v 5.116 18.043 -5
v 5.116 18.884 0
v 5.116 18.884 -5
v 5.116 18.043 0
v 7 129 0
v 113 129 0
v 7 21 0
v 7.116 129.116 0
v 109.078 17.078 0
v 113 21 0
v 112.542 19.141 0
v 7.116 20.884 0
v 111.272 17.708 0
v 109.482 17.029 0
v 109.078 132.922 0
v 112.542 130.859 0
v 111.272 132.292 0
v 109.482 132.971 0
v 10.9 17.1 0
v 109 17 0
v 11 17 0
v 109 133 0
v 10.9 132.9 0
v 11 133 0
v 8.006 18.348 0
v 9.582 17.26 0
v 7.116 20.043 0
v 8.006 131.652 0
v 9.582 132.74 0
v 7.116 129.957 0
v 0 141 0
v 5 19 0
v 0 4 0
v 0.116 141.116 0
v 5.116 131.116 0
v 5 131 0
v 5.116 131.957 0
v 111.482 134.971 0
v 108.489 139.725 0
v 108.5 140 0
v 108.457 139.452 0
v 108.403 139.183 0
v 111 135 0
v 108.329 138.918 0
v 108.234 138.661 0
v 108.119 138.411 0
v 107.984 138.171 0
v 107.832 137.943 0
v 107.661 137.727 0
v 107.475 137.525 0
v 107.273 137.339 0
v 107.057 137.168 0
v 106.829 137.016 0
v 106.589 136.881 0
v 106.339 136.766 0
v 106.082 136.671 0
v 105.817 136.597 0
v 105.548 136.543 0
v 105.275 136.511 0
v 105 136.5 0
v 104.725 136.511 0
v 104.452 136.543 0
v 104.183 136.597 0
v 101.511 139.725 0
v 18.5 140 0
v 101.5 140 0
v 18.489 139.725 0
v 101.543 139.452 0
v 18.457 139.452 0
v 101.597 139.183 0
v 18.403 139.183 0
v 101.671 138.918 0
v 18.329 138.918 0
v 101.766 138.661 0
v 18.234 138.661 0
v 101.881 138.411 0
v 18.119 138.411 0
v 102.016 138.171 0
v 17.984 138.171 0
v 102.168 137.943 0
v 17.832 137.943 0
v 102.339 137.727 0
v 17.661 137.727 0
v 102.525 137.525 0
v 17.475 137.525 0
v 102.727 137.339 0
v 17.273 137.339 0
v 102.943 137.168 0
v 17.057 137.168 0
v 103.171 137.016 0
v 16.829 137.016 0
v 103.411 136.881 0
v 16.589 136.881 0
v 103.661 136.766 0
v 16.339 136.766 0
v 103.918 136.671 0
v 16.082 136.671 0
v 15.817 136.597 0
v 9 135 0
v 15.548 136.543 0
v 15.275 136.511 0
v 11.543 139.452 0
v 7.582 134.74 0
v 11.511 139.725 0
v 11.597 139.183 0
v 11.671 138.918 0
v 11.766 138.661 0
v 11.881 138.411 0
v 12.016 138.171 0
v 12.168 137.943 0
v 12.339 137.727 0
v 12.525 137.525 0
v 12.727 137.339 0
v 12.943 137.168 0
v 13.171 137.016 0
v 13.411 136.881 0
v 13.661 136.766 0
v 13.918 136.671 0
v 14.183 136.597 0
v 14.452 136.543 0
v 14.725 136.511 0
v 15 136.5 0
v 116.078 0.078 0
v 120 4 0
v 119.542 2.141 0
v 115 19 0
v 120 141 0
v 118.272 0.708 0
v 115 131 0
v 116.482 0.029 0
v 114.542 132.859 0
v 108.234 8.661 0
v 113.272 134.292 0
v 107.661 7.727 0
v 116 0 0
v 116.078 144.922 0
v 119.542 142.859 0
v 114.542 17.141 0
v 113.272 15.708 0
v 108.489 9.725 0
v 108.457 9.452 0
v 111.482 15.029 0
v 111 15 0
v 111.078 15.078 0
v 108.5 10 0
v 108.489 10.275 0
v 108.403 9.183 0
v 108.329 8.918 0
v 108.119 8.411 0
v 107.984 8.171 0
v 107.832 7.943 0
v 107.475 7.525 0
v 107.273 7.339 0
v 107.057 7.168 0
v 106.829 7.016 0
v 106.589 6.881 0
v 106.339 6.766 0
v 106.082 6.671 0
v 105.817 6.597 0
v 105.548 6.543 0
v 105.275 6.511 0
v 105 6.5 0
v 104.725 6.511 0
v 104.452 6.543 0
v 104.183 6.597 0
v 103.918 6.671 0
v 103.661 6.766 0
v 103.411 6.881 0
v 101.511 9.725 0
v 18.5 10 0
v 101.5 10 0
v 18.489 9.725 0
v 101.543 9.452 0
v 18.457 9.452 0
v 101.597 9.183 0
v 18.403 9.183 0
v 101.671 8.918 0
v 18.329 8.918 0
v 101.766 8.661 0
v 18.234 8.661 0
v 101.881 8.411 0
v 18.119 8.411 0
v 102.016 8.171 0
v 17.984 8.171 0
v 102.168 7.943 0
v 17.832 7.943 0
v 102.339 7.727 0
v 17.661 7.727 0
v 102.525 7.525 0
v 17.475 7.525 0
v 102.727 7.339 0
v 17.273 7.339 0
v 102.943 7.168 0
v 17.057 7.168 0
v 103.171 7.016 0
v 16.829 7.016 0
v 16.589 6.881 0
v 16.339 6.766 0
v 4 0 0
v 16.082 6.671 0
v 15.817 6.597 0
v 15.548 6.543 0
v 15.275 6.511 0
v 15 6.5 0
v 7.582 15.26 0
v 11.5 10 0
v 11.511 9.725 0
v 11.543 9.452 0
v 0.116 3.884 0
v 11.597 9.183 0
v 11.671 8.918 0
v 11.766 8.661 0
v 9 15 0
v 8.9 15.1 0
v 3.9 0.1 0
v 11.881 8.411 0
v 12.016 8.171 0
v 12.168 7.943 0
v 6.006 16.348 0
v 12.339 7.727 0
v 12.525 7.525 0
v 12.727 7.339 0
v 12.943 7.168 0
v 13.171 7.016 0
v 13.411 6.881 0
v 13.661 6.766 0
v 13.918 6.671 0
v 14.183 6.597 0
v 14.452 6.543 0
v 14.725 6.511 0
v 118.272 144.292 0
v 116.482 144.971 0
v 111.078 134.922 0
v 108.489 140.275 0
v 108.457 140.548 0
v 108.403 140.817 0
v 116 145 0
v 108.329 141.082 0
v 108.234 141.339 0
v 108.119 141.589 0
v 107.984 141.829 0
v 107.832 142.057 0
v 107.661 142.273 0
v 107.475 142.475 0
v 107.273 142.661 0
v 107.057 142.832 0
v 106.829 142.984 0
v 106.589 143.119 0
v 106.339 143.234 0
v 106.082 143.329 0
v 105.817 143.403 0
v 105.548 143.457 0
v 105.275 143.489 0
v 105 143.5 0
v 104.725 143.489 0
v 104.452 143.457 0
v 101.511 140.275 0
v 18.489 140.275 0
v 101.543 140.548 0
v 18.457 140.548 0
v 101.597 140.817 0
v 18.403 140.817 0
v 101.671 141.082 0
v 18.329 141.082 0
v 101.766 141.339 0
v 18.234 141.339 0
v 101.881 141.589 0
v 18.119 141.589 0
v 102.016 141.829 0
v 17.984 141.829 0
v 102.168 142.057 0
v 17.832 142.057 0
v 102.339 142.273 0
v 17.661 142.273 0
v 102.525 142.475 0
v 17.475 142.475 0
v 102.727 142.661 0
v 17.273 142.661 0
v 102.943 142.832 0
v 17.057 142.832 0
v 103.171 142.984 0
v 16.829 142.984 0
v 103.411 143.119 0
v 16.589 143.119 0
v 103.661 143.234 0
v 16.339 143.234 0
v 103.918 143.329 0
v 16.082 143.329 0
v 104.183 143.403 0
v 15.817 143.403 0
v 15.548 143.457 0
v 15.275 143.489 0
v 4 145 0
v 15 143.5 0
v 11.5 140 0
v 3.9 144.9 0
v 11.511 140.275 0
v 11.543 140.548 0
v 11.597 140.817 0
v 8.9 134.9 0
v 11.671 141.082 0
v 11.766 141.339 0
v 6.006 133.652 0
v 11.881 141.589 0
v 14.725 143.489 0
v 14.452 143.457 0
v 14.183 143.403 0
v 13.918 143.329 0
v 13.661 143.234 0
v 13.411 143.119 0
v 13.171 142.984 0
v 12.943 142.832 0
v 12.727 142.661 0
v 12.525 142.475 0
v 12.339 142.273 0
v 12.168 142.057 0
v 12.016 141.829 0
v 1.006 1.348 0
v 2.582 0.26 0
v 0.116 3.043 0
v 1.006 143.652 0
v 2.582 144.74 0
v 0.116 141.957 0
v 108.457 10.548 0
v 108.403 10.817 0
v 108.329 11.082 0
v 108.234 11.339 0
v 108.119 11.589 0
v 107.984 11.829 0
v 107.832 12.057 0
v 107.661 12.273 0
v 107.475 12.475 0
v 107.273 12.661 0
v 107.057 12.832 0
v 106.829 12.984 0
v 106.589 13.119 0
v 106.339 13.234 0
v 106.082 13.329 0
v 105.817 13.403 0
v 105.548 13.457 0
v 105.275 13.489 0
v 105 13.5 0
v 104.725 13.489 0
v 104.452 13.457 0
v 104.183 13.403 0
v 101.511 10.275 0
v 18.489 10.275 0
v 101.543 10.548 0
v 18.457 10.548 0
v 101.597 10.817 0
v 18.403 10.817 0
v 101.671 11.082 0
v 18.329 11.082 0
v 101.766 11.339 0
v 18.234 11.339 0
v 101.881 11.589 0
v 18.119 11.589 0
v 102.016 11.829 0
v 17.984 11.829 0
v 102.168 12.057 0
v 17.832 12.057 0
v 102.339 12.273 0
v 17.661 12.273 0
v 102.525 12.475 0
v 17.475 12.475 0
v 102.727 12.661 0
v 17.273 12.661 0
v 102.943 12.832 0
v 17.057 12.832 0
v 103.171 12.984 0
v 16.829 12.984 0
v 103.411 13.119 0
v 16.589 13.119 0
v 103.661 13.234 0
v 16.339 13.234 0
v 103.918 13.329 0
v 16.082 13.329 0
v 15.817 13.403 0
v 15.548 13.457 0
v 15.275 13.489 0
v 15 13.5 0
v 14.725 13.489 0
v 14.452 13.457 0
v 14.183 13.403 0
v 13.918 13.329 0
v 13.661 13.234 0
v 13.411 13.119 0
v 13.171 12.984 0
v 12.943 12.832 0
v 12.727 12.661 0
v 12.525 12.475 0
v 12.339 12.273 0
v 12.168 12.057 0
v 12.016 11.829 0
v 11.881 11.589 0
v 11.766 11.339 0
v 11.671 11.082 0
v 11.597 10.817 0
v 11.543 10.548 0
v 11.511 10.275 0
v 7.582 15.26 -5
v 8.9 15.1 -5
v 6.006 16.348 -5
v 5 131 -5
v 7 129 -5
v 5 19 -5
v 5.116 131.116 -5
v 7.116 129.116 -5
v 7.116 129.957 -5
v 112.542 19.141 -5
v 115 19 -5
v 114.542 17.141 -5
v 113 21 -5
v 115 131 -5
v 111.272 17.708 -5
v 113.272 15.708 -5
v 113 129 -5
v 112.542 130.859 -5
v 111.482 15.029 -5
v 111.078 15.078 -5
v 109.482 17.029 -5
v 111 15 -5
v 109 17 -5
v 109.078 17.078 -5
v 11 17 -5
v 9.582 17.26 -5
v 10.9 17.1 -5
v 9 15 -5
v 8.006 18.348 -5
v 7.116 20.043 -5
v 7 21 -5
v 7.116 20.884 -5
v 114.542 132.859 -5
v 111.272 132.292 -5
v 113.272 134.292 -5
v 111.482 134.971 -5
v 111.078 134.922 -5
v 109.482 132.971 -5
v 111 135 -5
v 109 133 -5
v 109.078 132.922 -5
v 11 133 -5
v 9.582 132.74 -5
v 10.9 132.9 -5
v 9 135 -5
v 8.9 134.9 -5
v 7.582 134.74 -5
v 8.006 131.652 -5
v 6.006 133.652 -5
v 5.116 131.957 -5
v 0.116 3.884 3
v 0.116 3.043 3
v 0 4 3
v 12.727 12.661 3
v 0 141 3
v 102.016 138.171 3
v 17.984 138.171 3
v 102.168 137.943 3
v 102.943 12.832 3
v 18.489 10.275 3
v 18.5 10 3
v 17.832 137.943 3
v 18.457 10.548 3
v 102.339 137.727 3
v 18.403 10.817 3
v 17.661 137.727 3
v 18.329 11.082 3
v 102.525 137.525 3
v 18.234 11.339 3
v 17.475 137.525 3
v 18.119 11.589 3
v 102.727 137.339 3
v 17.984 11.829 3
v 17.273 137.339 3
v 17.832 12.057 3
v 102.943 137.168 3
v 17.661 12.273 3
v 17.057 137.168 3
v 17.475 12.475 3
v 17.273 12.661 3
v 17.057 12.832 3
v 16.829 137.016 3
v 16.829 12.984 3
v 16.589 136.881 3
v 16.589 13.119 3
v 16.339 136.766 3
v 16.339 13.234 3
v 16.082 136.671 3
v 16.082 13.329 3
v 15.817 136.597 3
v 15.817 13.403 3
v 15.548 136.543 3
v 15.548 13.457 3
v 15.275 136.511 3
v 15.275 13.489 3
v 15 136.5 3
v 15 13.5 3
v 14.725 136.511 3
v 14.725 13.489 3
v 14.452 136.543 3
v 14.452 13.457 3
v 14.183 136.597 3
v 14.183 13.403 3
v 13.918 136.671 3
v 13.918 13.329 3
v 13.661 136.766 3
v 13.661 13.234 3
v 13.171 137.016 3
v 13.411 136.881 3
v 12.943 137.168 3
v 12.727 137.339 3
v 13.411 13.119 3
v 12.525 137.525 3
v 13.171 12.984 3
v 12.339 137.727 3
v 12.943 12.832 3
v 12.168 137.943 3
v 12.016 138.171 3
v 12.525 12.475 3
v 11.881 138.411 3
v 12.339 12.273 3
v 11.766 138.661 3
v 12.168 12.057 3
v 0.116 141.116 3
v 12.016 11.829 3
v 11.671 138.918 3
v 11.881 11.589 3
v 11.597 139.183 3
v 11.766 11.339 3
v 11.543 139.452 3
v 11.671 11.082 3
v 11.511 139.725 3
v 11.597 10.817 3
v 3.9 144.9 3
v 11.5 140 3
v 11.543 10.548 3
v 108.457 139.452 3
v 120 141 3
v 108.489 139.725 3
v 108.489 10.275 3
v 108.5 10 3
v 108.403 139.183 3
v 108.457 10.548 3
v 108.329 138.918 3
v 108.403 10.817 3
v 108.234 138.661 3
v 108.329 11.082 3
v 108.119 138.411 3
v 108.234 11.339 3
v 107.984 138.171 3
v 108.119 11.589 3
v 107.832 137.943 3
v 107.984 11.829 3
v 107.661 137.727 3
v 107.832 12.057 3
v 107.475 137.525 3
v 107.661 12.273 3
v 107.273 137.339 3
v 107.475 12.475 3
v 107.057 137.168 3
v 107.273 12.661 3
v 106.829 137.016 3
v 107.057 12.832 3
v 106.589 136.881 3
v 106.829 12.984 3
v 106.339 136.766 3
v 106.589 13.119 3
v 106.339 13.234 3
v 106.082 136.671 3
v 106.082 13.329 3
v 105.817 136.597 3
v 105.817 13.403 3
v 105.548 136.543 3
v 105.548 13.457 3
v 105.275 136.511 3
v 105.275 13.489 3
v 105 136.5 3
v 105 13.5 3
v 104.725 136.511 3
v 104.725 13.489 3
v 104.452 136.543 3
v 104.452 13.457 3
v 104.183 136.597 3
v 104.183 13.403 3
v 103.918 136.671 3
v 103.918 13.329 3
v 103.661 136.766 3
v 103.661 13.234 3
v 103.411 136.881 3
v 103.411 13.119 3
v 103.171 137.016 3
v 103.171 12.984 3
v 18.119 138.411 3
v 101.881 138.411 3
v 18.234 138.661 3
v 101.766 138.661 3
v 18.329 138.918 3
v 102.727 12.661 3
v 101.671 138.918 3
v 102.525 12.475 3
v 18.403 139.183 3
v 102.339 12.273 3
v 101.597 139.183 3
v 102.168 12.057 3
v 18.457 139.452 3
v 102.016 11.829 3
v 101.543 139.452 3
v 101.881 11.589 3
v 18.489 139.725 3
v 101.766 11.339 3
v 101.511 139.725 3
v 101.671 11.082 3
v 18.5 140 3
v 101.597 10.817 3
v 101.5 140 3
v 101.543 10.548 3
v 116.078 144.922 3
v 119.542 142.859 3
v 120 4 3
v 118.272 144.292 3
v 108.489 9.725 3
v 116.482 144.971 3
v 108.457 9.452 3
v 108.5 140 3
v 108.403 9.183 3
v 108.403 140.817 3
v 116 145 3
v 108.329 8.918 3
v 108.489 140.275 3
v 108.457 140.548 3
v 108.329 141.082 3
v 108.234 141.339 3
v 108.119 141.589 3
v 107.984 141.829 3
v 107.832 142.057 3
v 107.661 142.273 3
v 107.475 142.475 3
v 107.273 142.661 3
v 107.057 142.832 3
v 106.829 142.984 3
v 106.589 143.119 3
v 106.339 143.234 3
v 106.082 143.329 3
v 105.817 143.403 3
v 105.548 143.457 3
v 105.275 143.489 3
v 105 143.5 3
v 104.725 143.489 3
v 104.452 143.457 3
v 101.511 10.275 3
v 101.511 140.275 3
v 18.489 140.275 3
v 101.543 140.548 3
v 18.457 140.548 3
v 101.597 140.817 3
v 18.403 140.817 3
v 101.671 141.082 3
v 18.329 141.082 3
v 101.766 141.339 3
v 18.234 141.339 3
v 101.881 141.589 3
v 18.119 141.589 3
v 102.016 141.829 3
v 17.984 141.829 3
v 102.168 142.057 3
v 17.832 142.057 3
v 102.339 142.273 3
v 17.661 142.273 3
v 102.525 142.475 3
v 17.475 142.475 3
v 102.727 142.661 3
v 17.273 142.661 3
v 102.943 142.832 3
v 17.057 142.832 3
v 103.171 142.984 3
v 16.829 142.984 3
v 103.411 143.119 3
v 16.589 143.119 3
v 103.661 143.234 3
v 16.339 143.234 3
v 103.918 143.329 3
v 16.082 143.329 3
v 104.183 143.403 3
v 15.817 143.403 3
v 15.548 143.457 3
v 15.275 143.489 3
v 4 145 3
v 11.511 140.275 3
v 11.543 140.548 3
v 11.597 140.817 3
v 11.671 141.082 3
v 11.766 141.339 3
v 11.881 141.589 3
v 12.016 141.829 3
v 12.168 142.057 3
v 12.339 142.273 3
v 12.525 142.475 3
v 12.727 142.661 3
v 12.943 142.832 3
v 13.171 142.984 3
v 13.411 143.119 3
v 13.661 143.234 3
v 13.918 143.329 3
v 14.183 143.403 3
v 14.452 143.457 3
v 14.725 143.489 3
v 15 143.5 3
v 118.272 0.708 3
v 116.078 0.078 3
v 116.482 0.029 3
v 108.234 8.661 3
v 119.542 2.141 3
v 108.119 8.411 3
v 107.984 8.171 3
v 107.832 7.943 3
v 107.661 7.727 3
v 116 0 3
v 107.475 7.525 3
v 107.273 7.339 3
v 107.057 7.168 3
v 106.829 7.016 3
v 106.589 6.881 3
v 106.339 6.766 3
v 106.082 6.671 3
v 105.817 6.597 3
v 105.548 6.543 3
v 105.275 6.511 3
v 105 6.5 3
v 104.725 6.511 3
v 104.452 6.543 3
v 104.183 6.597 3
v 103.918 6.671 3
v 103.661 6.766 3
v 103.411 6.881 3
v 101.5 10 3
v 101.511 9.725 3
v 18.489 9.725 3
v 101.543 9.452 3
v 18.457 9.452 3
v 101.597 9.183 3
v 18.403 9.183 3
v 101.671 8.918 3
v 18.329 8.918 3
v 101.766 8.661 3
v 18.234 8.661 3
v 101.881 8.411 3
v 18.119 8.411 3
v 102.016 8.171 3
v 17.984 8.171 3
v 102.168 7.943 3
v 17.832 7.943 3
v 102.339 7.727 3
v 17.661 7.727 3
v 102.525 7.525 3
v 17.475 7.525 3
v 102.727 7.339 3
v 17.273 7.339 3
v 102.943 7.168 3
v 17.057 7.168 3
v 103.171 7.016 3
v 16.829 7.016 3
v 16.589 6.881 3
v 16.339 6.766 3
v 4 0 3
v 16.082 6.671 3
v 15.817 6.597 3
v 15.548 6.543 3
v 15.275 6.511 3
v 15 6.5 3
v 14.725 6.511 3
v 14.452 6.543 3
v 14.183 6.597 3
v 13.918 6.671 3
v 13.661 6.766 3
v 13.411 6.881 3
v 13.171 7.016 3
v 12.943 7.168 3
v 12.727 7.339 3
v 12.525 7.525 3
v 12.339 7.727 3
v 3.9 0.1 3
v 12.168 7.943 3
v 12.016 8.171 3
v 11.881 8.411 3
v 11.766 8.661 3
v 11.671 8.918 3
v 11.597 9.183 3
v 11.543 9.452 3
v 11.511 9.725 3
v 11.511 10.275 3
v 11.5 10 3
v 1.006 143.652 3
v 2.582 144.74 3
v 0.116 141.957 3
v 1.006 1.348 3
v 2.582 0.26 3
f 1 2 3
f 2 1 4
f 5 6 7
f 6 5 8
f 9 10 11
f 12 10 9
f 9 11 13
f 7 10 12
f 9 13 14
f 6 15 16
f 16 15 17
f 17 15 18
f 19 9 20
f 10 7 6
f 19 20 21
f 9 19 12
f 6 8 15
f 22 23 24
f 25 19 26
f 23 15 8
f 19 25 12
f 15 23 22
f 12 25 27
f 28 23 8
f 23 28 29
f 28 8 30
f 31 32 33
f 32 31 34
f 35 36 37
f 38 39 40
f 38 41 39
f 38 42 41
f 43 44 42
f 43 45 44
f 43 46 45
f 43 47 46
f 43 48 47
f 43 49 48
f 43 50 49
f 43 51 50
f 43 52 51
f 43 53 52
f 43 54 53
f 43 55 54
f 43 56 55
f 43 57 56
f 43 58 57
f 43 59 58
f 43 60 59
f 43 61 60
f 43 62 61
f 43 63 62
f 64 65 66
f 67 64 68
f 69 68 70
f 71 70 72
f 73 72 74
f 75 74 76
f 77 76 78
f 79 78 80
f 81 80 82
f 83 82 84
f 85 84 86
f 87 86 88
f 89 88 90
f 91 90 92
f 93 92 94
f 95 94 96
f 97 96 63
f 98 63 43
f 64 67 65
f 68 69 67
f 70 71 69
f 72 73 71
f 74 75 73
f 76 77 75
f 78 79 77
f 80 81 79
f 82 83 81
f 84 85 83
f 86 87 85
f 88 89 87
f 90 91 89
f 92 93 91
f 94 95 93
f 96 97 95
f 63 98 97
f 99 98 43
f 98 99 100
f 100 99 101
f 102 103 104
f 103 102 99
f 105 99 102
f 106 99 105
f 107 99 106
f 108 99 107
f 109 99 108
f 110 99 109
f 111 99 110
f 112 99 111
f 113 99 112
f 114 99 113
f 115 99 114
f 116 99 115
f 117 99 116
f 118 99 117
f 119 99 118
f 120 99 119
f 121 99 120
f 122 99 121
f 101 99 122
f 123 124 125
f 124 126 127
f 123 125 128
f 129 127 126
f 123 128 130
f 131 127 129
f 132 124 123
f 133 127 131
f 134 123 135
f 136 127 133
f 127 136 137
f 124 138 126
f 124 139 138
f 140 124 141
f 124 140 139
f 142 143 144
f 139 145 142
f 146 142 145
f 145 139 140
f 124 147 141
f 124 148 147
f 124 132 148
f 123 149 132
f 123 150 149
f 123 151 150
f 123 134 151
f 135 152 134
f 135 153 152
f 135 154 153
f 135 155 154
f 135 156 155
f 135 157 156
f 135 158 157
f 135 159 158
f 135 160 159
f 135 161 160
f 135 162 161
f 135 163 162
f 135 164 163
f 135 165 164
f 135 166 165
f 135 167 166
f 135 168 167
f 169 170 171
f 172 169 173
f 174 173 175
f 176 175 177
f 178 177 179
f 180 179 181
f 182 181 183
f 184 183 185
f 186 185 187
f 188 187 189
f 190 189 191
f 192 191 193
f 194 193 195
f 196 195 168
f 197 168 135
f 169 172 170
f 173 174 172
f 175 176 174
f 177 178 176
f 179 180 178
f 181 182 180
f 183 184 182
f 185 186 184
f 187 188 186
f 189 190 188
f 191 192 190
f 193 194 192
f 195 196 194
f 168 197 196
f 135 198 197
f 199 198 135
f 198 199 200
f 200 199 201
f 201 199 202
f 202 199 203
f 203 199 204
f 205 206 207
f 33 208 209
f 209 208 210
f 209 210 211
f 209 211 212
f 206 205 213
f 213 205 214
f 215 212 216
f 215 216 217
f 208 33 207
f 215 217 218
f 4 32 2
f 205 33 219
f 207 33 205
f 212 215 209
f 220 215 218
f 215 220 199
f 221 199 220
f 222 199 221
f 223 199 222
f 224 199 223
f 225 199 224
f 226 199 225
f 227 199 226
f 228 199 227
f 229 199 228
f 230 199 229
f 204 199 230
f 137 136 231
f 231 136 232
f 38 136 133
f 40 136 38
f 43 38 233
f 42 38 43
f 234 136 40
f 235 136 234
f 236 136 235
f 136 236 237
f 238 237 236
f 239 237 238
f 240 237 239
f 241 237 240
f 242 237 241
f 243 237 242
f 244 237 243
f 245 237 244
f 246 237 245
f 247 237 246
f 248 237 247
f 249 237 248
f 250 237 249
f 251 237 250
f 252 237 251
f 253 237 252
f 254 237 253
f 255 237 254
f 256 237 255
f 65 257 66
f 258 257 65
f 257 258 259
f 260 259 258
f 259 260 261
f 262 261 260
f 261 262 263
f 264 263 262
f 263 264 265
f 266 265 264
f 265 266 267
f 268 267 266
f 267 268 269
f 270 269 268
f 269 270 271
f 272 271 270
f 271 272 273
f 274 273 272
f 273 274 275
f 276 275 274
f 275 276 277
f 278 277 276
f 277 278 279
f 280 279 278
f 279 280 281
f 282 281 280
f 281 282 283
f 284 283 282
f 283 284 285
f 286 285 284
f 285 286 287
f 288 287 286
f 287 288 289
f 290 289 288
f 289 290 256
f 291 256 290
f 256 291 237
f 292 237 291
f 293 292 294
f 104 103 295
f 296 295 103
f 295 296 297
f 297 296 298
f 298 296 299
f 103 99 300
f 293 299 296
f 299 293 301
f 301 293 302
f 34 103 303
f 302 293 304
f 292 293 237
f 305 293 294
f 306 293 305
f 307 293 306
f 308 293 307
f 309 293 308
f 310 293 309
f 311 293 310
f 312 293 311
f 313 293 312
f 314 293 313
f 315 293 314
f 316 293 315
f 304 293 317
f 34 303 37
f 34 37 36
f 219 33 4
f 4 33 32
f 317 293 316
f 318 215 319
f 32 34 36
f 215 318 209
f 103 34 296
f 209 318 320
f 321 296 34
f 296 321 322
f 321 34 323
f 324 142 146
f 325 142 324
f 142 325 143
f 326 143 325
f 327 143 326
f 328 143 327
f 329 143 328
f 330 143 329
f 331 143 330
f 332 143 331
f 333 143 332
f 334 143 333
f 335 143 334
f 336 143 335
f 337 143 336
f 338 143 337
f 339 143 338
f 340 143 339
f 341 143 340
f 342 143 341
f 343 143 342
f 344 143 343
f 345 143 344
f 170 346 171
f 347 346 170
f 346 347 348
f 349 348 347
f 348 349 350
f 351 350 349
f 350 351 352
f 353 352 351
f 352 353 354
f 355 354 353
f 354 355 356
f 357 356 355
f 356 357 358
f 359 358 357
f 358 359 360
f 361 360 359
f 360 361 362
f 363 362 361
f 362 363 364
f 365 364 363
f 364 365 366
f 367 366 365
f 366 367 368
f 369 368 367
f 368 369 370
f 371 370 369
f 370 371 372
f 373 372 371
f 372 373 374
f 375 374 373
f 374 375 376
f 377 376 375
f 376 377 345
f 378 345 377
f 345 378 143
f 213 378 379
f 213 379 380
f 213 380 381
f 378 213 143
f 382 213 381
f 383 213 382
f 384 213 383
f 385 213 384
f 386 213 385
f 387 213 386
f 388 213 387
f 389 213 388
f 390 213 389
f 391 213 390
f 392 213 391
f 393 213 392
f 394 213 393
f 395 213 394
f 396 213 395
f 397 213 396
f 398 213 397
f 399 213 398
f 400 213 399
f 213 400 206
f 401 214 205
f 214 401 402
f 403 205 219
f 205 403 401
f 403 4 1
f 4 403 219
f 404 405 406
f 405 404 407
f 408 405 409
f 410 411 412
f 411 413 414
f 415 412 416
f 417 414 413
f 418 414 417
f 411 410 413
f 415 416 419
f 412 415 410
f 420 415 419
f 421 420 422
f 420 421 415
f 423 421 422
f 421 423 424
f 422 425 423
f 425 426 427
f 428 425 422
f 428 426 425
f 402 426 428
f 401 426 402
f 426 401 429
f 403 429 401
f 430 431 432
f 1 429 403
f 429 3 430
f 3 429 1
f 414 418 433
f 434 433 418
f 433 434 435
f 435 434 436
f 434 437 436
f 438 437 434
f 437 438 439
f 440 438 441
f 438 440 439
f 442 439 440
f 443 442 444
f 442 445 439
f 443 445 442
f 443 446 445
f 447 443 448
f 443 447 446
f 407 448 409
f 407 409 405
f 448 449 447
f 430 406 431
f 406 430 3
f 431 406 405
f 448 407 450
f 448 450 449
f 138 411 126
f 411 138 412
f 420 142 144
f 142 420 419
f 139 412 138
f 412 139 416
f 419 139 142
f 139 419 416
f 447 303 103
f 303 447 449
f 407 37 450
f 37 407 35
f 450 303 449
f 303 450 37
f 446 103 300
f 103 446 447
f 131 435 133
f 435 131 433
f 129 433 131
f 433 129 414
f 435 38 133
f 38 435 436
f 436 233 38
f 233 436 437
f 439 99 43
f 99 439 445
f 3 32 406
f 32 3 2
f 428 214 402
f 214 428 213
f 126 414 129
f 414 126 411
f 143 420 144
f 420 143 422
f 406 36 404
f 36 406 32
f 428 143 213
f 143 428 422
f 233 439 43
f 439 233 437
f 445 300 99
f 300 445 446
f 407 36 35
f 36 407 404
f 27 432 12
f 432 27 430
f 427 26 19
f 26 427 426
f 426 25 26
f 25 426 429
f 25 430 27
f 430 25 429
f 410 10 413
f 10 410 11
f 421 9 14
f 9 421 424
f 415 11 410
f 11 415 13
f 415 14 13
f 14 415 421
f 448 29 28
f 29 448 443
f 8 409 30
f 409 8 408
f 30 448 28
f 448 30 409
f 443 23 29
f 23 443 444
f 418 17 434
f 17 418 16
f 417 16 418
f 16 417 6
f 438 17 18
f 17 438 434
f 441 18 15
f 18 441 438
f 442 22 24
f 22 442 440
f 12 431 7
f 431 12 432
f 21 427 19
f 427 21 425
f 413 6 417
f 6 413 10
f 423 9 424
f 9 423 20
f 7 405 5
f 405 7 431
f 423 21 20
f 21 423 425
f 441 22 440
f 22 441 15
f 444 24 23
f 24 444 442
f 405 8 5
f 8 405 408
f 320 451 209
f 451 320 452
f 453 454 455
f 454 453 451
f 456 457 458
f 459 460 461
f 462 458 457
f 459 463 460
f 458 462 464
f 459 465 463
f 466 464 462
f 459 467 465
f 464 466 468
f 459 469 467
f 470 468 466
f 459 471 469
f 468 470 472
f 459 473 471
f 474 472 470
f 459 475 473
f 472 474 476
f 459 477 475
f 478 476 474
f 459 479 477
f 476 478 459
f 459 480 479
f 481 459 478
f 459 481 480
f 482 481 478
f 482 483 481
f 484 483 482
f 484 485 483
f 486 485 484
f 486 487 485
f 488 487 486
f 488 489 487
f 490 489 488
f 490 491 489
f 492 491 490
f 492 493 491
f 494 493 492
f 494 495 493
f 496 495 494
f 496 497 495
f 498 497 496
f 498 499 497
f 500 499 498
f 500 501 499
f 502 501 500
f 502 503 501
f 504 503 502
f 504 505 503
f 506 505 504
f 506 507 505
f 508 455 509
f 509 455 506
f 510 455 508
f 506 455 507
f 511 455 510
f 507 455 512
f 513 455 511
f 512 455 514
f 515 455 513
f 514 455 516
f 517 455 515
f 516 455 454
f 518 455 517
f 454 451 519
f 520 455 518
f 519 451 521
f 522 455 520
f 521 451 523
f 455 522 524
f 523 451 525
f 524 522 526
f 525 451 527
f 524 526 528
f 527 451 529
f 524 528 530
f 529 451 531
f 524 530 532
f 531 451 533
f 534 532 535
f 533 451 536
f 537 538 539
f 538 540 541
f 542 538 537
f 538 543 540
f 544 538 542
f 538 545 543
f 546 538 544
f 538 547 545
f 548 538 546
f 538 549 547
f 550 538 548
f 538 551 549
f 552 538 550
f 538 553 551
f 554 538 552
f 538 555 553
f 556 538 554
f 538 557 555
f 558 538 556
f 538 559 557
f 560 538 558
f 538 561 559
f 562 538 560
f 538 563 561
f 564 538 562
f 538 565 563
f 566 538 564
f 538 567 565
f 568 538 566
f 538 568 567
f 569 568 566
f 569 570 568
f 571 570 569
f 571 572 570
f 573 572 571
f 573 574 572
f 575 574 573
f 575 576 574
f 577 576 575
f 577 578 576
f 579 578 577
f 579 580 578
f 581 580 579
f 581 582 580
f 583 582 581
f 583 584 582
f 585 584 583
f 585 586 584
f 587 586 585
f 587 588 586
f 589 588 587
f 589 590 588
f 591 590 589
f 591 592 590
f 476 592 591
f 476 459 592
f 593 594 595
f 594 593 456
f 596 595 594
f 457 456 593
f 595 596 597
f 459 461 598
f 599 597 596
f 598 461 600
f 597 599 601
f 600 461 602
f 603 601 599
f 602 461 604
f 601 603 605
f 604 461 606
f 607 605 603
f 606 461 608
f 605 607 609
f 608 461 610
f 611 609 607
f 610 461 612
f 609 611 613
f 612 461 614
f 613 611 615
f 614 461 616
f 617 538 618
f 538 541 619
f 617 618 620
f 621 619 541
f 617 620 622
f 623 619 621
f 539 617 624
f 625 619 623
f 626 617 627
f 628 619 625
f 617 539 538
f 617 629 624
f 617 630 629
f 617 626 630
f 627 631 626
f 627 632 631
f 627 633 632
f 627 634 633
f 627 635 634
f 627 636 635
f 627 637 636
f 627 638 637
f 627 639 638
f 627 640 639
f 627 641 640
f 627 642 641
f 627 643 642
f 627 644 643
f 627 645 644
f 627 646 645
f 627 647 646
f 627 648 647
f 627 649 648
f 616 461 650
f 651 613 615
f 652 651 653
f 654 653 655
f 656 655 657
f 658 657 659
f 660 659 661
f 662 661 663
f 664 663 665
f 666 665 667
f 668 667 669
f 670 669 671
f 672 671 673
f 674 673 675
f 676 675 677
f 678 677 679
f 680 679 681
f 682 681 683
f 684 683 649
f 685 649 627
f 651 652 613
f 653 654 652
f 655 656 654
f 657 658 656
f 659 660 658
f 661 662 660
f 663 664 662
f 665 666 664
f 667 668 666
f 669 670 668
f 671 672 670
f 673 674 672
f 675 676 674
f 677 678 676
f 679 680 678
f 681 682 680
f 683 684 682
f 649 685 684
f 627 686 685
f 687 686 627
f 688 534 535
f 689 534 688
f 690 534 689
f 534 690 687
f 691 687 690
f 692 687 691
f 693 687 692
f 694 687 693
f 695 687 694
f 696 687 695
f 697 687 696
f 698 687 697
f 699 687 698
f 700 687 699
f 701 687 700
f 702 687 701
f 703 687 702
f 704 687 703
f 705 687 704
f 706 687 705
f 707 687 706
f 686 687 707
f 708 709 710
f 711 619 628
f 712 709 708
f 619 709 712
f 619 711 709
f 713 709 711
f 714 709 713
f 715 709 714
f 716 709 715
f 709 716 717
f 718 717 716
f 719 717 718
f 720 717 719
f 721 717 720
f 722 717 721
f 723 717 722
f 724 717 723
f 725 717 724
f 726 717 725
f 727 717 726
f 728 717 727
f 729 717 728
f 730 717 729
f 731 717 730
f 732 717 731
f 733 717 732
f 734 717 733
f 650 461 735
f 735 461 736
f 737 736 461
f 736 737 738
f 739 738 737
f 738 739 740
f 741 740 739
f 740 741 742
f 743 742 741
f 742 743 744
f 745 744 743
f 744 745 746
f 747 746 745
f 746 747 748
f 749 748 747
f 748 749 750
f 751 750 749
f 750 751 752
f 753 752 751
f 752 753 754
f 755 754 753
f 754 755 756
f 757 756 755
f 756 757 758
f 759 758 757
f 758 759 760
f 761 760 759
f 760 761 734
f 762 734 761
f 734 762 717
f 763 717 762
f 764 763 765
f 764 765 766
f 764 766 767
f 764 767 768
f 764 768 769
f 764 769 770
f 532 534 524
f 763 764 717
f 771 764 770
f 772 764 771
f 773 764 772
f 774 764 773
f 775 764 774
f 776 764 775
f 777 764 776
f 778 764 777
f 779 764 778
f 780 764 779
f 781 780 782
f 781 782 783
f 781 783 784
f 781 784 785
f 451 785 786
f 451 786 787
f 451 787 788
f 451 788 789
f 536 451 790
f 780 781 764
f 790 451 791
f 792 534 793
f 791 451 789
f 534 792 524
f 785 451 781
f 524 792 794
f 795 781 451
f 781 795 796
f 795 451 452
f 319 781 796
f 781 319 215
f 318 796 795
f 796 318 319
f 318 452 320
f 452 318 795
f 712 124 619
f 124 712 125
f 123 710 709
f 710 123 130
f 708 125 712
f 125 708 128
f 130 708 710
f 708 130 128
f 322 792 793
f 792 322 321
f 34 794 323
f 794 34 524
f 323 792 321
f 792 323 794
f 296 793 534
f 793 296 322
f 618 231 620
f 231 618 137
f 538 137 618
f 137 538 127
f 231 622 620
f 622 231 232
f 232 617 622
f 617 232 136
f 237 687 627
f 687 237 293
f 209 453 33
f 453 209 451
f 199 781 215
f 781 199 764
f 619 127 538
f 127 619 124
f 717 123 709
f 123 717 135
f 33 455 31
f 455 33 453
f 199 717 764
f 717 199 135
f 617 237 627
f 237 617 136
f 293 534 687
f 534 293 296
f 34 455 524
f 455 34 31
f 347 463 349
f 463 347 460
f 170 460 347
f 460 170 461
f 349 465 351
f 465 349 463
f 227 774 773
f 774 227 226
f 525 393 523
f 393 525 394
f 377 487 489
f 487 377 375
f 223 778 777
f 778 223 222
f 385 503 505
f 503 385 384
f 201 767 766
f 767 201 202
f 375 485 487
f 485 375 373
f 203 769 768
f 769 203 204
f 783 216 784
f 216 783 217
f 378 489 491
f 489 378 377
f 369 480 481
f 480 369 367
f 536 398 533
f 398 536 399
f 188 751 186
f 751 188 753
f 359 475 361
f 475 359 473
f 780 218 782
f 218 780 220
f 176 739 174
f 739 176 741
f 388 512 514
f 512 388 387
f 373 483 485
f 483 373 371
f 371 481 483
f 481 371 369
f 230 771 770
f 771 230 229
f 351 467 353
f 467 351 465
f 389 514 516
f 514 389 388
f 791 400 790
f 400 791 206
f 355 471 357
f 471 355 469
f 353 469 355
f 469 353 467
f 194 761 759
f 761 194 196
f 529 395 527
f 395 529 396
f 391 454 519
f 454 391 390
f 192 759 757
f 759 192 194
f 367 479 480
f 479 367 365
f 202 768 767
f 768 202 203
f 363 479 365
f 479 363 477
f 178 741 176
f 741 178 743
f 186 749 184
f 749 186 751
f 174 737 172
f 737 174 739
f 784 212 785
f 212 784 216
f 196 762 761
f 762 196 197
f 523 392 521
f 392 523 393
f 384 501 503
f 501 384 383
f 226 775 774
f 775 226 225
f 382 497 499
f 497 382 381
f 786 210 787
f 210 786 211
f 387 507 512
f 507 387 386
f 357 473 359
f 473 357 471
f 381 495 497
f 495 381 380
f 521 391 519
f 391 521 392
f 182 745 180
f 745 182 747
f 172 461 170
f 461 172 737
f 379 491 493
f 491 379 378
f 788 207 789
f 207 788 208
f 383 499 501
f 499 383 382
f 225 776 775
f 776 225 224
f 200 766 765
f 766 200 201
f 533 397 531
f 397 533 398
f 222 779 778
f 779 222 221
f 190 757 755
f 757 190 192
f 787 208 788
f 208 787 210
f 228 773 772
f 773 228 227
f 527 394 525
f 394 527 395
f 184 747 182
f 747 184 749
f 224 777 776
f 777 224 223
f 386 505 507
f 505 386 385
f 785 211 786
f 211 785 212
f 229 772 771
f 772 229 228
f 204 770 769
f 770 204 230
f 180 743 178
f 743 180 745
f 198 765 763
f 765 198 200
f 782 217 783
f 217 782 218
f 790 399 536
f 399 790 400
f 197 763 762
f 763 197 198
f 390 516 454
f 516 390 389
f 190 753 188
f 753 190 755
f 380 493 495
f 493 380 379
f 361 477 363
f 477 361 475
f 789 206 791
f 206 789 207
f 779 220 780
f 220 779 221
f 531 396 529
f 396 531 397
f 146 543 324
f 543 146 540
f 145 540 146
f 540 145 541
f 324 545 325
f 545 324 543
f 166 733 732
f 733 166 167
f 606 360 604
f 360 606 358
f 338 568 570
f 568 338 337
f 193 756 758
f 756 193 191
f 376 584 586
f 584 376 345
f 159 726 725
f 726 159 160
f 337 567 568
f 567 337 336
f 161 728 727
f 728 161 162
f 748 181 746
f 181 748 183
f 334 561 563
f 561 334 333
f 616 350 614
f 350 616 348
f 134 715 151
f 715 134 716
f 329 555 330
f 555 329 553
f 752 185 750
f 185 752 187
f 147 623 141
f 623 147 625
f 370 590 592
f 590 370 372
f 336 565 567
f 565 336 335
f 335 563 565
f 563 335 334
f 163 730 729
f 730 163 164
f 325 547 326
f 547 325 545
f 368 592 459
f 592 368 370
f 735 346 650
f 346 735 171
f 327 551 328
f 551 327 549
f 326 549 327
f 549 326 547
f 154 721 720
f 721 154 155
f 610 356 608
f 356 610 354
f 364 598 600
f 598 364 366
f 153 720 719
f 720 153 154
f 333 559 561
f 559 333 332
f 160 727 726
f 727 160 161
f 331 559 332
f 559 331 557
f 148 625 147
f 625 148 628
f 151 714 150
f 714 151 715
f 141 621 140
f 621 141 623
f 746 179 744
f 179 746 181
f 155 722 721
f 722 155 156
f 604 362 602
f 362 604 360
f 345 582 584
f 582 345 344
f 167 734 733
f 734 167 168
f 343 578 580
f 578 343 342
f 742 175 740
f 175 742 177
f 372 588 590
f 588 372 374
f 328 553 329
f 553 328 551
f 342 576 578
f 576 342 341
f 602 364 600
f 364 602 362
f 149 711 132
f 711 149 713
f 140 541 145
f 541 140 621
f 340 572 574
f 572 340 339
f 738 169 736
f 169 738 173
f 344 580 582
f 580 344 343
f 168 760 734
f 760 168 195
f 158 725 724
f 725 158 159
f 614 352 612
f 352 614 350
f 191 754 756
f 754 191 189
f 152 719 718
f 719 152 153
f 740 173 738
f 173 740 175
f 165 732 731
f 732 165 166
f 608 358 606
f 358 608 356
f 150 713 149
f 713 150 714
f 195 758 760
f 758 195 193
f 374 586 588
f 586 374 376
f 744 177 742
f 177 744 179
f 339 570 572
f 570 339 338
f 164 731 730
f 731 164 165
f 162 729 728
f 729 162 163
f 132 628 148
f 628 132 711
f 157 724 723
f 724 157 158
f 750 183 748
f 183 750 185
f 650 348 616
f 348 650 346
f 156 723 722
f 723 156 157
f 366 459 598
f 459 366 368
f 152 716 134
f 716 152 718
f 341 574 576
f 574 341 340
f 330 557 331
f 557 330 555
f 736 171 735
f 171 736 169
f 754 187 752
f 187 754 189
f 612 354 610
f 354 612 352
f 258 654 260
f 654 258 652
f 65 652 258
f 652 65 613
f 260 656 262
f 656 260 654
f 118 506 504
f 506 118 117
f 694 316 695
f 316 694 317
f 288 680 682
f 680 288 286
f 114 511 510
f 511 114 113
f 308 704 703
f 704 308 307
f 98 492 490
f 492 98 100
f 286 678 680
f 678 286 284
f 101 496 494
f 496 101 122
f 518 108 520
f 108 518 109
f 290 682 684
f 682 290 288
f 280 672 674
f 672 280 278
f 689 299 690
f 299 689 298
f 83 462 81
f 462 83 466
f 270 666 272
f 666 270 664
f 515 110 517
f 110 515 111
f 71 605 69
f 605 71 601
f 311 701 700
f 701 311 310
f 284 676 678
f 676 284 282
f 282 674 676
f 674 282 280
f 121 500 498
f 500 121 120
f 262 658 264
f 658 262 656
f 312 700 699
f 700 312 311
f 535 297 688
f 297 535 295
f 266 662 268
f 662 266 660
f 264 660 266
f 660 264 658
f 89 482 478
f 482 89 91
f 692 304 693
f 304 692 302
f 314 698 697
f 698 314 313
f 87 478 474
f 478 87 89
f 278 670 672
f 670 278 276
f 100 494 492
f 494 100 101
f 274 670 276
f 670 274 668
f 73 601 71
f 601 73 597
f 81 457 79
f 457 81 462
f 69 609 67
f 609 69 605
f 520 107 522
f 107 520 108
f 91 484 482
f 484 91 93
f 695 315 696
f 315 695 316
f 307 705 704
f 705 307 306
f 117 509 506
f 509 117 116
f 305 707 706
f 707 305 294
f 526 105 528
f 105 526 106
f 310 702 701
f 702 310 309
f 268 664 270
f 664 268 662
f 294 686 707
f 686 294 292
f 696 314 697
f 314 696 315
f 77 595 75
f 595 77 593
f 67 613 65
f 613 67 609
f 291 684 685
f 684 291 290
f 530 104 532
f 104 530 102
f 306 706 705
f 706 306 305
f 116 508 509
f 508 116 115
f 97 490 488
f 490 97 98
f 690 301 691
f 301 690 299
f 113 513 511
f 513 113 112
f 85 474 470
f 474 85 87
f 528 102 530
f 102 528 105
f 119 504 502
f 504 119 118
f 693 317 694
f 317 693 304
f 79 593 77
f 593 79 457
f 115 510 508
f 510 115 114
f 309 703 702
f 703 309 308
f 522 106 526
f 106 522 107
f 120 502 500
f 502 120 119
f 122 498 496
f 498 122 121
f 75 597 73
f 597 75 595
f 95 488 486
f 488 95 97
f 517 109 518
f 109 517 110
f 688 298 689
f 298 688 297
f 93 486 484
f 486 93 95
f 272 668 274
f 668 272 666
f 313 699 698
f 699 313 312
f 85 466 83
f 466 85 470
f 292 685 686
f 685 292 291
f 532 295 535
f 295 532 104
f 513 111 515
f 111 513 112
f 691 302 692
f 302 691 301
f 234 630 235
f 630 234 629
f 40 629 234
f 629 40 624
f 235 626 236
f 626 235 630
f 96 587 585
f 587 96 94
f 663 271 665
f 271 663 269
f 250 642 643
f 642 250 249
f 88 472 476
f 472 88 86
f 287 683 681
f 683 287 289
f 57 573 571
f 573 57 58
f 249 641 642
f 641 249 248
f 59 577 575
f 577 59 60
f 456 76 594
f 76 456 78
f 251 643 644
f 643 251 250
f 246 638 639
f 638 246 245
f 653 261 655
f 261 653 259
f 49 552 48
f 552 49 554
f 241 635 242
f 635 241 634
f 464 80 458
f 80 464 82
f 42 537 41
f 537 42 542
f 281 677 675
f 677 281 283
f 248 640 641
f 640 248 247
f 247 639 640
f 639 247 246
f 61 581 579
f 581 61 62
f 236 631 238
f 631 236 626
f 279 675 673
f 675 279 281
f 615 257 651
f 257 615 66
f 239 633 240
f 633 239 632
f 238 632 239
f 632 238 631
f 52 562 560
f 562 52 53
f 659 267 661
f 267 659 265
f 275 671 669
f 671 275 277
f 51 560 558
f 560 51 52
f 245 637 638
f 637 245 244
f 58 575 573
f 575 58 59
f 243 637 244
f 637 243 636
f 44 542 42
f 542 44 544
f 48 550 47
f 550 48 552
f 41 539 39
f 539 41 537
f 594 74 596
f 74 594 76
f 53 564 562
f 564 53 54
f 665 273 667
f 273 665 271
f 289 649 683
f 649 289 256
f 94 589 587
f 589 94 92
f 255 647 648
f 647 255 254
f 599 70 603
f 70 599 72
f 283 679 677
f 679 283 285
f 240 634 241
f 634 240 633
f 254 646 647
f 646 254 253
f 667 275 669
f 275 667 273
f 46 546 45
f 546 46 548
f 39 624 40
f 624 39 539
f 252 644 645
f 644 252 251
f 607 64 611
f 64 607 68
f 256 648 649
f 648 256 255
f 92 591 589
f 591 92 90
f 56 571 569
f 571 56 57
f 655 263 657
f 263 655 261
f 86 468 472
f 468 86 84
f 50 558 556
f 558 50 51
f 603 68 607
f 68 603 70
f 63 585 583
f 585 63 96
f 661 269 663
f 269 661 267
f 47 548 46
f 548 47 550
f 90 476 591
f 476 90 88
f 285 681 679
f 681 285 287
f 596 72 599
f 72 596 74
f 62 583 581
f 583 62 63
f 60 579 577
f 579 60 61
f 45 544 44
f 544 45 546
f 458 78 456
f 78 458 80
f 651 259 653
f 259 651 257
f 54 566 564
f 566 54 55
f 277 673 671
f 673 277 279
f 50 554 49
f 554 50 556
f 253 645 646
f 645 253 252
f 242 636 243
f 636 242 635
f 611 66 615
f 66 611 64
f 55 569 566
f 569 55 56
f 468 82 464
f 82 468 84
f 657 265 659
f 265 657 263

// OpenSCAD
module noCornersCube(width, height, depth, cornerRadius) {
    
    //cube([width, height, depth]);
    union() {
        linear_extrude(height=depth) {
            // Square with corners cut.
            polygon([
            [cornerRadius,0],
            [width-cornerRadius, 0],
            [width, cornerRadius],
            [width, height-cornerRadius],
            [width-cornerRadius, height],
            [cornerRadius, height],
            [0, height-cornerRadius],
            [0, cornerRadius],
            [cornerRadius,0]
            ]);
        }
        
    }
}

module roundedCube(width, height, depth, cornerRadius) {
    
    //cube([width, height, depth]);
    union() {
        translate([cornerRadius,cornerRadius,0]) {
            cylinder(r=cornerRadius, h=depth);   
        }
        translate([width-cornerRadius,cornerRadius,0]) {
            cylinder(r=cornerRadius, h=depth);
        }
        translate([cornerRadius,height-cornerRadius,0]) {
            cylinder(r=cornerRadius, h=depth);
        }
        translate([width-cornerRadius,height-cornerRadius,0]) {
            cylinder(r=cornerRadius, h=depth);
        }
        
        noCornersCube(width, height, depth, cornerRadius);
    }
}

module mountinghole(xOffset, yOffset) {
    // Mounting holes...
    // First hole, 10mm from left edge
    translate([5 + xOffset, 15 + yOffset, -0.01]) {
        cylinder(d=7, h=5, $fn=80);
        // 7mm hole to allow clearance for a M3 nut to drop in
        // so the bolt can be held in place.
        // this outlet place is then held in with an upper assembly.
    }
}

module mountingHoles() {
    // Holes 90mm appart on X (110mm x hole, 10mm in each side).
    // Holes -5 and +5 from Y edges. Y is 120 long
    translate([0,0,0]) {
        mountinghole(10, -5);
        #mountinghole(100, -5);
        mountinghole(10, 120+5);
        mountinghole(100, 120+5);
    }
}

// Inset piece.
// FIXED SIZE
translate([5,15,-5]) {
    difference() {
        union() {
            roundedCube(110, 120, 5, 4);
        }
        union() {
            translate([2,2,-0.01]) {
                #roundedCube(110-4, 120-4, 5.1, 4);
            }
        }
    }
}

// Face peice
// face is 5mm from edge in x (+/-5mm side to side
// 10mm in the y (+/-10mm back to front).
difference() {
    union() {
        #roundedCube(120, 145,3, 4);
    }
    union() {
        translate([7,17,-0.01]) {
            //roundedCube(120-(4+10), 130-(4+10), 3.1, 4);
        }
        mountingHoles();
    }
}
